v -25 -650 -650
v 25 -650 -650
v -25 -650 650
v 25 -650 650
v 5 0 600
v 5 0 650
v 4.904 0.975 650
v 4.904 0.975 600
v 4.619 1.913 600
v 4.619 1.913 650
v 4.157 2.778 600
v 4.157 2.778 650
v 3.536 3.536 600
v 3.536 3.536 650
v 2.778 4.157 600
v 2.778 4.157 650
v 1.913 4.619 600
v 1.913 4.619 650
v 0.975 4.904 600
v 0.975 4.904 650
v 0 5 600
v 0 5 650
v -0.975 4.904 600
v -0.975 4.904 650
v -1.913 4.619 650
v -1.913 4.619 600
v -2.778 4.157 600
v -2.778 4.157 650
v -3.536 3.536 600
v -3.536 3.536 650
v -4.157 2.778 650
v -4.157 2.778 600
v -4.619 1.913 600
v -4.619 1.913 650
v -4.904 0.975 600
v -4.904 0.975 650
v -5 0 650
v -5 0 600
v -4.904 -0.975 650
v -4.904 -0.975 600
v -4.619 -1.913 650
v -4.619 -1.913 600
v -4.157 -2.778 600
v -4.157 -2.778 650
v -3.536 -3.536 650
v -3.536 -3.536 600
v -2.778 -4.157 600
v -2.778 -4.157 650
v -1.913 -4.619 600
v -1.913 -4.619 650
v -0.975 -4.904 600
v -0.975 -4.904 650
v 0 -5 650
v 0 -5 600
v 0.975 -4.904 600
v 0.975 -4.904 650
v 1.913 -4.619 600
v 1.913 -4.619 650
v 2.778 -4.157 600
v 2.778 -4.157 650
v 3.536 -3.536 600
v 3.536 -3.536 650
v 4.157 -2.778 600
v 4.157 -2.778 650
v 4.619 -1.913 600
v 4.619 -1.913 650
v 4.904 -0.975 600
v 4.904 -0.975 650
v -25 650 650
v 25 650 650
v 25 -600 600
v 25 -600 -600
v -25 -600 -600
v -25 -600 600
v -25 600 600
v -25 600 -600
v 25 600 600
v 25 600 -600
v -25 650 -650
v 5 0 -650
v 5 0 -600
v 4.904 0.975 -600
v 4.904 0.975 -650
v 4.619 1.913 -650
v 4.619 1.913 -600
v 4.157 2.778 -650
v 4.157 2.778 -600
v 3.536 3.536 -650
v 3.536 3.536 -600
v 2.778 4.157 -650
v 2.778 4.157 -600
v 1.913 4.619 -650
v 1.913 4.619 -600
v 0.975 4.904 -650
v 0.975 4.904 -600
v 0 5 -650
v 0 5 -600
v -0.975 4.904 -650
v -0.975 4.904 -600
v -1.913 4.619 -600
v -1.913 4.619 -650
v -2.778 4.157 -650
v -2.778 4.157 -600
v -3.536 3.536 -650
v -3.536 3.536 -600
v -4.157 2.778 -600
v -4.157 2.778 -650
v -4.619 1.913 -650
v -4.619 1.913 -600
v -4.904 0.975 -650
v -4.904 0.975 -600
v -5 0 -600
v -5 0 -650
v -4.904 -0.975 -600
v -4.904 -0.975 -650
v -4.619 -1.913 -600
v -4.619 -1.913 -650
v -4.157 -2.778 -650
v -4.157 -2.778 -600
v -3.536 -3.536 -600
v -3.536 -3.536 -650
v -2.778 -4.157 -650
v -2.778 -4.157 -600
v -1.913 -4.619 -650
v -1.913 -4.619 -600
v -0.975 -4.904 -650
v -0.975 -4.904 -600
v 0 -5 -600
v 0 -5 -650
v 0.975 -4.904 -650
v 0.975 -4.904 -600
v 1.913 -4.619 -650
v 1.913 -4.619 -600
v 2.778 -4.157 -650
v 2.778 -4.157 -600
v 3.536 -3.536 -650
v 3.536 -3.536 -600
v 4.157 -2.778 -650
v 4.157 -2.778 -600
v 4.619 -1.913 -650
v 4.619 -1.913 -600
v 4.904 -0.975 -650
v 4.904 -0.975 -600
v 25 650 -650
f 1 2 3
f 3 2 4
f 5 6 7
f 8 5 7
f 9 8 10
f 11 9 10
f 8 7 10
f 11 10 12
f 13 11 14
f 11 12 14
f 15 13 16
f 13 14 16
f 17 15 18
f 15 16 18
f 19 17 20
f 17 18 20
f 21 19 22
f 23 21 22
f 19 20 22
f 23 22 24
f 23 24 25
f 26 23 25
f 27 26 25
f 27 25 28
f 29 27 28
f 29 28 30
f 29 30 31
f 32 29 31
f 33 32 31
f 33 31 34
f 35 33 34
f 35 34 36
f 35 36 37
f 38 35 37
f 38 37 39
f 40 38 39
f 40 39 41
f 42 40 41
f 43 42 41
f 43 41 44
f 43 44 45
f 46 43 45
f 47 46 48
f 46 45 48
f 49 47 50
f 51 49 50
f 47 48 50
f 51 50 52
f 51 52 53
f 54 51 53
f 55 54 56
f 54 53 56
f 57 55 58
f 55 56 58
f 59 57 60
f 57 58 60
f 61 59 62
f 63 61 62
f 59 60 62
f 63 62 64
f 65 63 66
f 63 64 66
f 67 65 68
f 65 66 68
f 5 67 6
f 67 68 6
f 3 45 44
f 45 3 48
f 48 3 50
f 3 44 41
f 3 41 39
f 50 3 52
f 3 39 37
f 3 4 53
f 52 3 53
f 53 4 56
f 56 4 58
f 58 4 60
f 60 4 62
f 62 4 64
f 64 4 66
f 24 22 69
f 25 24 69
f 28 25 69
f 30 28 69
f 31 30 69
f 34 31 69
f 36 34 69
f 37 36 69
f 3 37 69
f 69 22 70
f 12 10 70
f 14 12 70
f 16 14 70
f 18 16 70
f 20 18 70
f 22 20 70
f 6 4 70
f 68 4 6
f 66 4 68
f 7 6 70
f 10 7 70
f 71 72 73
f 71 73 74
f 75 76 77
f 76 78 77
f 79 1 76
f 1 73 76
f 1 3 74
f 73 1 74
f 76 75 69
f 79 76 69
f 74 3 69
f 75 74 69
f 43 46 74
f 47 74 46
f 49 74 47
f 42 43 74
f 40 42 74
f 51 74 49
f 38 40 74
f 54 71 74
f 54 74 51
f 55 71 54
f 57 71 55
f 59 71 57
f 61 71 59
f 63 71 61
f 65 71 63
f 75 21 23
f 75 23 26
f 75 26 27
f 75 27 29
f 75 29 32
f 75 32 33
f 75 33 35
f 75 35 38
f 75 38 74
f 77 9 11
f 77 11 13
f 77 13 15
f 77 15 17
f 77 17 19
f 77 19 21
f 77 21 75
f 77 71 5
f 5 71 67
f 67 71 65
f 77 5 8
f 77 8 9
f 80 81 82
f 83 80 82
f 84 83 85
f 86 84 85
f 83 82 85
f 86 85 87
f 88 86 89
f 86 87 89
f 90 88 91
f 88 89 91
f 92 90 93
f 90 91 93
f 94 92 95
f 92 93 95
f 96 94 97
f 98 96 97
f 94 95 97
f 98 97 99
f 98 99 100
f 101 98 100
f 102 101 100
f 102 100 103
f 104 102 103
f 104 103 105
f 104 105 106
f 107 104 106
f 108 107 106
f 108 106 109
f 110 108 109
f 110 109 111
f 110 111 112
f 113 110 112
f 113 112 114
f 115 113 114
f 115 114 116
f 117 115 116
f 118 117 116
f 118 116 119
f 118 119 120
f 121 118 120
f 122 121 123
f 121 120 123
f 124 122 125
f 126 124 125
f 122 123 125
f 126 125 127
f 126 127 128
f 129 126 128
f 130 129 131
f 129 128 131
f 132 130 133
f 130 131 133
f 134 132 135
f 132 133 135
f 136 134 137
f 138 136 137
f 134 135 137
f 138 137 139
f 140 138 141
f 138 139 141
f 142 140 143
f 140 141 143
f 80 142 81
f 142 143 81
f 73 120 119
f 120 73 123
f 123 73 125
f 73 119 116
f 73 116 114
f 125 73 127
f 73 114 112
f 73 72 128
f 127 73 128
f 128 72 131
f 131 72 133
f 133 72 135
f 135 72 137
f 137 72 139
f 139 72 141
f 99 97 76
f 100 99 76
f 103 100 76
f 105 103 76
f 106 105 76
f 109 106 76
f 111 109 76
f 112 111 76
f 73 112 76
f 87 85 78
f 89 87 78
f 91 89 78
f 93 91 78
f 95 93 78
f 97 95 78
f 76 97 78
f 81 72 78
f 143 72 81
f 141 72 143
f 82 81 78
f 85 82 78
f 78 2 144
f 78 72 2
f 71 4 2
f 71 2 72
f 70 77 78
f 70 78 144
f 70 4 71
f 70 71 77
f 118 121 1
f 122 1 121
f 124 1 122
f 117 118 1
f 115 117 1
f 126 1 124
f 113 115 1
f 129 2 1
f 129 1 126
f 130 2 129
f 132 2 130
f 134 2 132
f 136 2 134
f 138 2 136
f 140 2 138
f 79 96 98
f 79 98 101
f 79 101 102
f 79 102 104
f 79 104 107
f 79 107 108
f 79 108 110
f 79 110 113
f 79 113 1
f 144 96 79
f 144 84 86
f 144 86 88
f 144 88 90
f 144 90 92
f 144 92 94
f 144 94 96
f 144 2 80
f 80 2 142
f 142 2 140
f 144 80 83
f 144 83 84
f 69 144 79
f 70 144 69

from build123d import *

# Parameters (mm, degrees)
SKETCH012_R      = 5
EXTRUDE012_DEPTH = 1500
SKETCH011_W      = 1300
SKETCH011_H      = 1300
SKETCH011_W_2    = 1200
SKETCH011_H_2    = 1200
EXTRUDE011_DEPTH = 25


with BuildPart() as extrude012:
    # Sketch012 (on Face1 of Extrude011) → Extrude012 (new body)
    with BuildSketch(Plane.XY.offset(650)):
        Circle(SKETCH012_R)
    extrude(amount=-EXTRUDE012_DEPTH)


with BuildPart() as cut006:
    # Sketch011 → Extrude011 (new body, symmetric)
    with BuildSketch(Plane.YZ):
        Rectangle(SKETCH011_W, SKETCH011_H)
        Rectangle(SKETCH011_W_2, SKETCH011_H_2, mode=Mode.SUBTRACT)
    extrude(amount=EXTRUDE011_DEPTH, both=True)

    # Cut006: cut Extrude012
    add(extrude012.part, mode=Mode.SUBTRACT)


solid = cut006.part
